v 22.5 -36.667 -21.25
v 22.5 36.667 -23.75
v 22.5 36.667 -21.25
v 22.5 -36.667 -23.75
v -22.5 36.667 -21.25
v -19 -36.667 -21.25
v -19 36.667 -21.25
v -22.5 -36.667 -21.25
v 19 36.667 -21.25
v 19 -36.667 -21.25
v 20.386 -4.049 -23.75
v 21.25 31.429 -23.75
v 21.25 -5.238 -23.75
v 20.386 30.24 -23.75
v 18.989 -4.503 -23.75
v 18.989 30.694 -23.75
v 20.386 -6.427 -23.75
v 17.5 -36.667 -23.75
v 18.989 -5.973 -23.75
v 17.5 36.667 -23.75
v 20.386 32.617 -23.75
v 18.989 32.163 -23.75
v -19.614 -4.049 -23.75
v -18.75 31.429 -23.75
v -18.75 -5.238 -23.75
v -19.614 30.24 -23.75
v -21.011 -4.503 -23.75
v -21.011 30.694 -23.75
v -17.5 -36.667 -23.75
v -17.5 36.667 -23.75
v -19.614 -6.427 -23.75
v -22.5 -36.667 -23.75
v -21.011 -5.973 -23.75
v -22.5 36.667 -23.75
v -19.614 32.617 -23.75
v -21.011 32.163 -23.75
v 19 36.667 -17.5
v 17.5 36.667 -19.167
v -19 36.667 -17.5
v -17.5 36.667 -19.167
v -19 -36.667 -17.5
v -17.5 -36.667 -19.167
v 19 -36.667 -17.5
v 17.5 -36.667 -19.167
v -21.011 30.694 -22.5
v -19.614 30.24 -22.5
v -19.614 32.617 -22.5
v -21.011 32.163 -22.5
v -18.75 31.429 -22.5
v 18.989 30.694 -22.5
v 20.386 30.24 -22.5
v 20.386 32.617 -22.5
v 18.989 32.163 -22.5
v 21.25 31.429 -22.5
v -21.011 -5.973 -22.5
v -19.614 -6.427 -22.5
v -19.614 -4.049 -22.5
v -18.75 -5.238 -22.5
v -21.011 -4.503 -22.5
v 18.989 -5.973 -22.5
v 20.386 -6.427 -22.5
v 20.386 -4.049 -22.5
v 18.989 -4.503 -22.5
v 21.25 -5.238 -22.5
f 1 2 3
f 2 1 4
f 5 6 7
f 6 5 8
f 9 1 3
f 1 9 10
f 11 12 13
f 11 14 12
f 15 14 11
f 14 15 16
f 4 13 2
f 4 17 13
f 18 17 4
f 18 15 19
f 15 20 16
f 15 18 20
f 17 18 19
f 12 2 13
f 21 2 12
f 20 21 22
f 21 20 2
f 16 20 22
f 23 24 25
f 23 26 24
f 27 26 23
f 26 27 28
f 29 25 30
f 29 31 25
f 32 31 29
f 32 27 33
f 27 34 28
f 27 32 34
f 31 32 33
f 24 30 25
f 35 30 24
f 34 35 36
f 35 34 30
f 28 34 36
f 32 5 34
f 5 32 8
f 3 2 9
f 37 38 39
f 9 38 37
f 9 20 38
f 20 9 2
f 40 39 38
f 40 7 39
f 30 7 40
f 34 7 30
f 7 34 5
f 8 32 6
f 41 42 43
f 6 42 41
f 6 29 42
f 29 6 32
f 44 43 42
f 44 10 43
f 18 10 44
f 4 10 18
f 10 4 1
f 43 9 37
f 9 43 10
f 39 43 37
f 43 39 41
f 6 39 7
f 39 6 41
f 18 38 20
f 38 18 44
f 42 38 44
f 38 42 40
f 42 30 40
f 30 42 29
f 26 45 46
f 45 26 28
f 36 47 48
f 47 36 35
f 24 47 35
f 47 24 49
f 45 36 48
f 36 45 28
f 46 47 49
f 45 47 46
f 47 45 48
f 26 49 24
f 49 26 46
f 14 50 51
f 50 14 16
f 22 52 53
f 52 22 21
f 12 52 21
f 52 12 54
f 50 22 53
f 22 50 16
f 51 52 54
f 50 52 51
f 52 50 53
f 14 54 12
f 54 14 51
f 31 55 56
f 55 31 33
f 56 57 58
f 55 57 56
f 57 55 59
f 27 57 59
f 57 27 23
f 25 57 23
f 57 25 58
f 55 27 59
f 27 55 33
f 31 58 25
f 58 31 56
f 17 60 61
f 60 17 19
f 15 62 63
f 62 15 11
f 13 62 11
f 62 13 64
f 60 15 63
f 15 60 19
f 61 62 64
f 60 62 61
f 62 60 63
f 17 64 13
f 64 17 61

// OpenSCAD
// DIYbio EasyPhoresis
// by alec_djinn 2014
// www.diybiogroningen.org

show_body = false;
show_gel = true;
show_comb = false;
use_nice_bottom = true;

// dimensions
width = 40;
height = 20;
depth = 110;
thickness = 2.5;


// body shape
module body(width,height,depth,thickness){
	difference() {
		minkowski(){
			cube([width,depth,height], center=true);
			cylinder(r=thickness, h=1);
		}
      if (use_nice_bottom)
      {
			translate([0,0,height]){
				rotate([0,90,0]){
					cylinder (h=3*height, r=height, center=true);
				}
			}
		}
	}
}


module gel(width,height,depth,thickness){
	translate([0,0,-height]){
	difference(){
		difference(){
			union(){
				translate([0,0,-height/8]){
					cube([width+2*thickness,depth/1.5,height/8], center=true);
				}
				cube([width-2,depth/1.5,height/4], center=true);
			}
			translate([0,0,-height/12]){
				cube([width-(2*thickness),depth/1.2,height/4], center=true);
			}
		}
		// comb holder
		translate([-width/2,depth/3.5,-2*thickness]){
			cylinder(h=thickness, r=thickness/2);
		}
		translate([width/2,depth/3.5,-2*thickness]){
			cylinder(h=thickness, r=thickness/2);
		}
		translate([-width/2,-depth/(6*3.5),-2*thickness]){
			cylinder(h=thickness, r=thickness/2);
		}
		translate([width/2,-depth/(6*3.5),-2*thickness]){
			cylinder(h=thickness, r=thickness/2);
		}
	}
	}
}

// 9 wells comb
module comb(width,height,depth,thickness){
	translate([0,0,-1.5*height]){
		union(){
			translate([-width/2,depth/3.5,-2*thickness]){
				cylinder(h=thickness, r=thickness/2);
			}
			translate([width/2,depth/3.5,-2*thickness]){
				cylinder(h=thickness, r=thickness/2);
			}
			translate([0,depth/3.5,(-height/8)-thickness]){
				cube([width+2*thickness,depth/12,height/8],center=true);	
			}
			translate([thickness/2,0,0]){
				// numbers of wells
				for(n=[1:2.4*width/10]){
					translate([(-width/2)+thickness*n*1.5,depth/3.5,-height/10]){
						cube([thickness,depth/64,height/5],center=true);	
					}
				}
			}
		}
	}
}


if (show_body)
{
	// body: shape - void
	difference(){
		body(width,height,depth,thickness);
		translate([0,0,-thickness]){
			body(width-thickness,height-thickness,depth-thickness);
		}
	}
}

if (show_gel)
{
  gel(width,height,depth,thickness);
}

if (show_comb)
{
  comb(width,height,depth,thickness);
}
